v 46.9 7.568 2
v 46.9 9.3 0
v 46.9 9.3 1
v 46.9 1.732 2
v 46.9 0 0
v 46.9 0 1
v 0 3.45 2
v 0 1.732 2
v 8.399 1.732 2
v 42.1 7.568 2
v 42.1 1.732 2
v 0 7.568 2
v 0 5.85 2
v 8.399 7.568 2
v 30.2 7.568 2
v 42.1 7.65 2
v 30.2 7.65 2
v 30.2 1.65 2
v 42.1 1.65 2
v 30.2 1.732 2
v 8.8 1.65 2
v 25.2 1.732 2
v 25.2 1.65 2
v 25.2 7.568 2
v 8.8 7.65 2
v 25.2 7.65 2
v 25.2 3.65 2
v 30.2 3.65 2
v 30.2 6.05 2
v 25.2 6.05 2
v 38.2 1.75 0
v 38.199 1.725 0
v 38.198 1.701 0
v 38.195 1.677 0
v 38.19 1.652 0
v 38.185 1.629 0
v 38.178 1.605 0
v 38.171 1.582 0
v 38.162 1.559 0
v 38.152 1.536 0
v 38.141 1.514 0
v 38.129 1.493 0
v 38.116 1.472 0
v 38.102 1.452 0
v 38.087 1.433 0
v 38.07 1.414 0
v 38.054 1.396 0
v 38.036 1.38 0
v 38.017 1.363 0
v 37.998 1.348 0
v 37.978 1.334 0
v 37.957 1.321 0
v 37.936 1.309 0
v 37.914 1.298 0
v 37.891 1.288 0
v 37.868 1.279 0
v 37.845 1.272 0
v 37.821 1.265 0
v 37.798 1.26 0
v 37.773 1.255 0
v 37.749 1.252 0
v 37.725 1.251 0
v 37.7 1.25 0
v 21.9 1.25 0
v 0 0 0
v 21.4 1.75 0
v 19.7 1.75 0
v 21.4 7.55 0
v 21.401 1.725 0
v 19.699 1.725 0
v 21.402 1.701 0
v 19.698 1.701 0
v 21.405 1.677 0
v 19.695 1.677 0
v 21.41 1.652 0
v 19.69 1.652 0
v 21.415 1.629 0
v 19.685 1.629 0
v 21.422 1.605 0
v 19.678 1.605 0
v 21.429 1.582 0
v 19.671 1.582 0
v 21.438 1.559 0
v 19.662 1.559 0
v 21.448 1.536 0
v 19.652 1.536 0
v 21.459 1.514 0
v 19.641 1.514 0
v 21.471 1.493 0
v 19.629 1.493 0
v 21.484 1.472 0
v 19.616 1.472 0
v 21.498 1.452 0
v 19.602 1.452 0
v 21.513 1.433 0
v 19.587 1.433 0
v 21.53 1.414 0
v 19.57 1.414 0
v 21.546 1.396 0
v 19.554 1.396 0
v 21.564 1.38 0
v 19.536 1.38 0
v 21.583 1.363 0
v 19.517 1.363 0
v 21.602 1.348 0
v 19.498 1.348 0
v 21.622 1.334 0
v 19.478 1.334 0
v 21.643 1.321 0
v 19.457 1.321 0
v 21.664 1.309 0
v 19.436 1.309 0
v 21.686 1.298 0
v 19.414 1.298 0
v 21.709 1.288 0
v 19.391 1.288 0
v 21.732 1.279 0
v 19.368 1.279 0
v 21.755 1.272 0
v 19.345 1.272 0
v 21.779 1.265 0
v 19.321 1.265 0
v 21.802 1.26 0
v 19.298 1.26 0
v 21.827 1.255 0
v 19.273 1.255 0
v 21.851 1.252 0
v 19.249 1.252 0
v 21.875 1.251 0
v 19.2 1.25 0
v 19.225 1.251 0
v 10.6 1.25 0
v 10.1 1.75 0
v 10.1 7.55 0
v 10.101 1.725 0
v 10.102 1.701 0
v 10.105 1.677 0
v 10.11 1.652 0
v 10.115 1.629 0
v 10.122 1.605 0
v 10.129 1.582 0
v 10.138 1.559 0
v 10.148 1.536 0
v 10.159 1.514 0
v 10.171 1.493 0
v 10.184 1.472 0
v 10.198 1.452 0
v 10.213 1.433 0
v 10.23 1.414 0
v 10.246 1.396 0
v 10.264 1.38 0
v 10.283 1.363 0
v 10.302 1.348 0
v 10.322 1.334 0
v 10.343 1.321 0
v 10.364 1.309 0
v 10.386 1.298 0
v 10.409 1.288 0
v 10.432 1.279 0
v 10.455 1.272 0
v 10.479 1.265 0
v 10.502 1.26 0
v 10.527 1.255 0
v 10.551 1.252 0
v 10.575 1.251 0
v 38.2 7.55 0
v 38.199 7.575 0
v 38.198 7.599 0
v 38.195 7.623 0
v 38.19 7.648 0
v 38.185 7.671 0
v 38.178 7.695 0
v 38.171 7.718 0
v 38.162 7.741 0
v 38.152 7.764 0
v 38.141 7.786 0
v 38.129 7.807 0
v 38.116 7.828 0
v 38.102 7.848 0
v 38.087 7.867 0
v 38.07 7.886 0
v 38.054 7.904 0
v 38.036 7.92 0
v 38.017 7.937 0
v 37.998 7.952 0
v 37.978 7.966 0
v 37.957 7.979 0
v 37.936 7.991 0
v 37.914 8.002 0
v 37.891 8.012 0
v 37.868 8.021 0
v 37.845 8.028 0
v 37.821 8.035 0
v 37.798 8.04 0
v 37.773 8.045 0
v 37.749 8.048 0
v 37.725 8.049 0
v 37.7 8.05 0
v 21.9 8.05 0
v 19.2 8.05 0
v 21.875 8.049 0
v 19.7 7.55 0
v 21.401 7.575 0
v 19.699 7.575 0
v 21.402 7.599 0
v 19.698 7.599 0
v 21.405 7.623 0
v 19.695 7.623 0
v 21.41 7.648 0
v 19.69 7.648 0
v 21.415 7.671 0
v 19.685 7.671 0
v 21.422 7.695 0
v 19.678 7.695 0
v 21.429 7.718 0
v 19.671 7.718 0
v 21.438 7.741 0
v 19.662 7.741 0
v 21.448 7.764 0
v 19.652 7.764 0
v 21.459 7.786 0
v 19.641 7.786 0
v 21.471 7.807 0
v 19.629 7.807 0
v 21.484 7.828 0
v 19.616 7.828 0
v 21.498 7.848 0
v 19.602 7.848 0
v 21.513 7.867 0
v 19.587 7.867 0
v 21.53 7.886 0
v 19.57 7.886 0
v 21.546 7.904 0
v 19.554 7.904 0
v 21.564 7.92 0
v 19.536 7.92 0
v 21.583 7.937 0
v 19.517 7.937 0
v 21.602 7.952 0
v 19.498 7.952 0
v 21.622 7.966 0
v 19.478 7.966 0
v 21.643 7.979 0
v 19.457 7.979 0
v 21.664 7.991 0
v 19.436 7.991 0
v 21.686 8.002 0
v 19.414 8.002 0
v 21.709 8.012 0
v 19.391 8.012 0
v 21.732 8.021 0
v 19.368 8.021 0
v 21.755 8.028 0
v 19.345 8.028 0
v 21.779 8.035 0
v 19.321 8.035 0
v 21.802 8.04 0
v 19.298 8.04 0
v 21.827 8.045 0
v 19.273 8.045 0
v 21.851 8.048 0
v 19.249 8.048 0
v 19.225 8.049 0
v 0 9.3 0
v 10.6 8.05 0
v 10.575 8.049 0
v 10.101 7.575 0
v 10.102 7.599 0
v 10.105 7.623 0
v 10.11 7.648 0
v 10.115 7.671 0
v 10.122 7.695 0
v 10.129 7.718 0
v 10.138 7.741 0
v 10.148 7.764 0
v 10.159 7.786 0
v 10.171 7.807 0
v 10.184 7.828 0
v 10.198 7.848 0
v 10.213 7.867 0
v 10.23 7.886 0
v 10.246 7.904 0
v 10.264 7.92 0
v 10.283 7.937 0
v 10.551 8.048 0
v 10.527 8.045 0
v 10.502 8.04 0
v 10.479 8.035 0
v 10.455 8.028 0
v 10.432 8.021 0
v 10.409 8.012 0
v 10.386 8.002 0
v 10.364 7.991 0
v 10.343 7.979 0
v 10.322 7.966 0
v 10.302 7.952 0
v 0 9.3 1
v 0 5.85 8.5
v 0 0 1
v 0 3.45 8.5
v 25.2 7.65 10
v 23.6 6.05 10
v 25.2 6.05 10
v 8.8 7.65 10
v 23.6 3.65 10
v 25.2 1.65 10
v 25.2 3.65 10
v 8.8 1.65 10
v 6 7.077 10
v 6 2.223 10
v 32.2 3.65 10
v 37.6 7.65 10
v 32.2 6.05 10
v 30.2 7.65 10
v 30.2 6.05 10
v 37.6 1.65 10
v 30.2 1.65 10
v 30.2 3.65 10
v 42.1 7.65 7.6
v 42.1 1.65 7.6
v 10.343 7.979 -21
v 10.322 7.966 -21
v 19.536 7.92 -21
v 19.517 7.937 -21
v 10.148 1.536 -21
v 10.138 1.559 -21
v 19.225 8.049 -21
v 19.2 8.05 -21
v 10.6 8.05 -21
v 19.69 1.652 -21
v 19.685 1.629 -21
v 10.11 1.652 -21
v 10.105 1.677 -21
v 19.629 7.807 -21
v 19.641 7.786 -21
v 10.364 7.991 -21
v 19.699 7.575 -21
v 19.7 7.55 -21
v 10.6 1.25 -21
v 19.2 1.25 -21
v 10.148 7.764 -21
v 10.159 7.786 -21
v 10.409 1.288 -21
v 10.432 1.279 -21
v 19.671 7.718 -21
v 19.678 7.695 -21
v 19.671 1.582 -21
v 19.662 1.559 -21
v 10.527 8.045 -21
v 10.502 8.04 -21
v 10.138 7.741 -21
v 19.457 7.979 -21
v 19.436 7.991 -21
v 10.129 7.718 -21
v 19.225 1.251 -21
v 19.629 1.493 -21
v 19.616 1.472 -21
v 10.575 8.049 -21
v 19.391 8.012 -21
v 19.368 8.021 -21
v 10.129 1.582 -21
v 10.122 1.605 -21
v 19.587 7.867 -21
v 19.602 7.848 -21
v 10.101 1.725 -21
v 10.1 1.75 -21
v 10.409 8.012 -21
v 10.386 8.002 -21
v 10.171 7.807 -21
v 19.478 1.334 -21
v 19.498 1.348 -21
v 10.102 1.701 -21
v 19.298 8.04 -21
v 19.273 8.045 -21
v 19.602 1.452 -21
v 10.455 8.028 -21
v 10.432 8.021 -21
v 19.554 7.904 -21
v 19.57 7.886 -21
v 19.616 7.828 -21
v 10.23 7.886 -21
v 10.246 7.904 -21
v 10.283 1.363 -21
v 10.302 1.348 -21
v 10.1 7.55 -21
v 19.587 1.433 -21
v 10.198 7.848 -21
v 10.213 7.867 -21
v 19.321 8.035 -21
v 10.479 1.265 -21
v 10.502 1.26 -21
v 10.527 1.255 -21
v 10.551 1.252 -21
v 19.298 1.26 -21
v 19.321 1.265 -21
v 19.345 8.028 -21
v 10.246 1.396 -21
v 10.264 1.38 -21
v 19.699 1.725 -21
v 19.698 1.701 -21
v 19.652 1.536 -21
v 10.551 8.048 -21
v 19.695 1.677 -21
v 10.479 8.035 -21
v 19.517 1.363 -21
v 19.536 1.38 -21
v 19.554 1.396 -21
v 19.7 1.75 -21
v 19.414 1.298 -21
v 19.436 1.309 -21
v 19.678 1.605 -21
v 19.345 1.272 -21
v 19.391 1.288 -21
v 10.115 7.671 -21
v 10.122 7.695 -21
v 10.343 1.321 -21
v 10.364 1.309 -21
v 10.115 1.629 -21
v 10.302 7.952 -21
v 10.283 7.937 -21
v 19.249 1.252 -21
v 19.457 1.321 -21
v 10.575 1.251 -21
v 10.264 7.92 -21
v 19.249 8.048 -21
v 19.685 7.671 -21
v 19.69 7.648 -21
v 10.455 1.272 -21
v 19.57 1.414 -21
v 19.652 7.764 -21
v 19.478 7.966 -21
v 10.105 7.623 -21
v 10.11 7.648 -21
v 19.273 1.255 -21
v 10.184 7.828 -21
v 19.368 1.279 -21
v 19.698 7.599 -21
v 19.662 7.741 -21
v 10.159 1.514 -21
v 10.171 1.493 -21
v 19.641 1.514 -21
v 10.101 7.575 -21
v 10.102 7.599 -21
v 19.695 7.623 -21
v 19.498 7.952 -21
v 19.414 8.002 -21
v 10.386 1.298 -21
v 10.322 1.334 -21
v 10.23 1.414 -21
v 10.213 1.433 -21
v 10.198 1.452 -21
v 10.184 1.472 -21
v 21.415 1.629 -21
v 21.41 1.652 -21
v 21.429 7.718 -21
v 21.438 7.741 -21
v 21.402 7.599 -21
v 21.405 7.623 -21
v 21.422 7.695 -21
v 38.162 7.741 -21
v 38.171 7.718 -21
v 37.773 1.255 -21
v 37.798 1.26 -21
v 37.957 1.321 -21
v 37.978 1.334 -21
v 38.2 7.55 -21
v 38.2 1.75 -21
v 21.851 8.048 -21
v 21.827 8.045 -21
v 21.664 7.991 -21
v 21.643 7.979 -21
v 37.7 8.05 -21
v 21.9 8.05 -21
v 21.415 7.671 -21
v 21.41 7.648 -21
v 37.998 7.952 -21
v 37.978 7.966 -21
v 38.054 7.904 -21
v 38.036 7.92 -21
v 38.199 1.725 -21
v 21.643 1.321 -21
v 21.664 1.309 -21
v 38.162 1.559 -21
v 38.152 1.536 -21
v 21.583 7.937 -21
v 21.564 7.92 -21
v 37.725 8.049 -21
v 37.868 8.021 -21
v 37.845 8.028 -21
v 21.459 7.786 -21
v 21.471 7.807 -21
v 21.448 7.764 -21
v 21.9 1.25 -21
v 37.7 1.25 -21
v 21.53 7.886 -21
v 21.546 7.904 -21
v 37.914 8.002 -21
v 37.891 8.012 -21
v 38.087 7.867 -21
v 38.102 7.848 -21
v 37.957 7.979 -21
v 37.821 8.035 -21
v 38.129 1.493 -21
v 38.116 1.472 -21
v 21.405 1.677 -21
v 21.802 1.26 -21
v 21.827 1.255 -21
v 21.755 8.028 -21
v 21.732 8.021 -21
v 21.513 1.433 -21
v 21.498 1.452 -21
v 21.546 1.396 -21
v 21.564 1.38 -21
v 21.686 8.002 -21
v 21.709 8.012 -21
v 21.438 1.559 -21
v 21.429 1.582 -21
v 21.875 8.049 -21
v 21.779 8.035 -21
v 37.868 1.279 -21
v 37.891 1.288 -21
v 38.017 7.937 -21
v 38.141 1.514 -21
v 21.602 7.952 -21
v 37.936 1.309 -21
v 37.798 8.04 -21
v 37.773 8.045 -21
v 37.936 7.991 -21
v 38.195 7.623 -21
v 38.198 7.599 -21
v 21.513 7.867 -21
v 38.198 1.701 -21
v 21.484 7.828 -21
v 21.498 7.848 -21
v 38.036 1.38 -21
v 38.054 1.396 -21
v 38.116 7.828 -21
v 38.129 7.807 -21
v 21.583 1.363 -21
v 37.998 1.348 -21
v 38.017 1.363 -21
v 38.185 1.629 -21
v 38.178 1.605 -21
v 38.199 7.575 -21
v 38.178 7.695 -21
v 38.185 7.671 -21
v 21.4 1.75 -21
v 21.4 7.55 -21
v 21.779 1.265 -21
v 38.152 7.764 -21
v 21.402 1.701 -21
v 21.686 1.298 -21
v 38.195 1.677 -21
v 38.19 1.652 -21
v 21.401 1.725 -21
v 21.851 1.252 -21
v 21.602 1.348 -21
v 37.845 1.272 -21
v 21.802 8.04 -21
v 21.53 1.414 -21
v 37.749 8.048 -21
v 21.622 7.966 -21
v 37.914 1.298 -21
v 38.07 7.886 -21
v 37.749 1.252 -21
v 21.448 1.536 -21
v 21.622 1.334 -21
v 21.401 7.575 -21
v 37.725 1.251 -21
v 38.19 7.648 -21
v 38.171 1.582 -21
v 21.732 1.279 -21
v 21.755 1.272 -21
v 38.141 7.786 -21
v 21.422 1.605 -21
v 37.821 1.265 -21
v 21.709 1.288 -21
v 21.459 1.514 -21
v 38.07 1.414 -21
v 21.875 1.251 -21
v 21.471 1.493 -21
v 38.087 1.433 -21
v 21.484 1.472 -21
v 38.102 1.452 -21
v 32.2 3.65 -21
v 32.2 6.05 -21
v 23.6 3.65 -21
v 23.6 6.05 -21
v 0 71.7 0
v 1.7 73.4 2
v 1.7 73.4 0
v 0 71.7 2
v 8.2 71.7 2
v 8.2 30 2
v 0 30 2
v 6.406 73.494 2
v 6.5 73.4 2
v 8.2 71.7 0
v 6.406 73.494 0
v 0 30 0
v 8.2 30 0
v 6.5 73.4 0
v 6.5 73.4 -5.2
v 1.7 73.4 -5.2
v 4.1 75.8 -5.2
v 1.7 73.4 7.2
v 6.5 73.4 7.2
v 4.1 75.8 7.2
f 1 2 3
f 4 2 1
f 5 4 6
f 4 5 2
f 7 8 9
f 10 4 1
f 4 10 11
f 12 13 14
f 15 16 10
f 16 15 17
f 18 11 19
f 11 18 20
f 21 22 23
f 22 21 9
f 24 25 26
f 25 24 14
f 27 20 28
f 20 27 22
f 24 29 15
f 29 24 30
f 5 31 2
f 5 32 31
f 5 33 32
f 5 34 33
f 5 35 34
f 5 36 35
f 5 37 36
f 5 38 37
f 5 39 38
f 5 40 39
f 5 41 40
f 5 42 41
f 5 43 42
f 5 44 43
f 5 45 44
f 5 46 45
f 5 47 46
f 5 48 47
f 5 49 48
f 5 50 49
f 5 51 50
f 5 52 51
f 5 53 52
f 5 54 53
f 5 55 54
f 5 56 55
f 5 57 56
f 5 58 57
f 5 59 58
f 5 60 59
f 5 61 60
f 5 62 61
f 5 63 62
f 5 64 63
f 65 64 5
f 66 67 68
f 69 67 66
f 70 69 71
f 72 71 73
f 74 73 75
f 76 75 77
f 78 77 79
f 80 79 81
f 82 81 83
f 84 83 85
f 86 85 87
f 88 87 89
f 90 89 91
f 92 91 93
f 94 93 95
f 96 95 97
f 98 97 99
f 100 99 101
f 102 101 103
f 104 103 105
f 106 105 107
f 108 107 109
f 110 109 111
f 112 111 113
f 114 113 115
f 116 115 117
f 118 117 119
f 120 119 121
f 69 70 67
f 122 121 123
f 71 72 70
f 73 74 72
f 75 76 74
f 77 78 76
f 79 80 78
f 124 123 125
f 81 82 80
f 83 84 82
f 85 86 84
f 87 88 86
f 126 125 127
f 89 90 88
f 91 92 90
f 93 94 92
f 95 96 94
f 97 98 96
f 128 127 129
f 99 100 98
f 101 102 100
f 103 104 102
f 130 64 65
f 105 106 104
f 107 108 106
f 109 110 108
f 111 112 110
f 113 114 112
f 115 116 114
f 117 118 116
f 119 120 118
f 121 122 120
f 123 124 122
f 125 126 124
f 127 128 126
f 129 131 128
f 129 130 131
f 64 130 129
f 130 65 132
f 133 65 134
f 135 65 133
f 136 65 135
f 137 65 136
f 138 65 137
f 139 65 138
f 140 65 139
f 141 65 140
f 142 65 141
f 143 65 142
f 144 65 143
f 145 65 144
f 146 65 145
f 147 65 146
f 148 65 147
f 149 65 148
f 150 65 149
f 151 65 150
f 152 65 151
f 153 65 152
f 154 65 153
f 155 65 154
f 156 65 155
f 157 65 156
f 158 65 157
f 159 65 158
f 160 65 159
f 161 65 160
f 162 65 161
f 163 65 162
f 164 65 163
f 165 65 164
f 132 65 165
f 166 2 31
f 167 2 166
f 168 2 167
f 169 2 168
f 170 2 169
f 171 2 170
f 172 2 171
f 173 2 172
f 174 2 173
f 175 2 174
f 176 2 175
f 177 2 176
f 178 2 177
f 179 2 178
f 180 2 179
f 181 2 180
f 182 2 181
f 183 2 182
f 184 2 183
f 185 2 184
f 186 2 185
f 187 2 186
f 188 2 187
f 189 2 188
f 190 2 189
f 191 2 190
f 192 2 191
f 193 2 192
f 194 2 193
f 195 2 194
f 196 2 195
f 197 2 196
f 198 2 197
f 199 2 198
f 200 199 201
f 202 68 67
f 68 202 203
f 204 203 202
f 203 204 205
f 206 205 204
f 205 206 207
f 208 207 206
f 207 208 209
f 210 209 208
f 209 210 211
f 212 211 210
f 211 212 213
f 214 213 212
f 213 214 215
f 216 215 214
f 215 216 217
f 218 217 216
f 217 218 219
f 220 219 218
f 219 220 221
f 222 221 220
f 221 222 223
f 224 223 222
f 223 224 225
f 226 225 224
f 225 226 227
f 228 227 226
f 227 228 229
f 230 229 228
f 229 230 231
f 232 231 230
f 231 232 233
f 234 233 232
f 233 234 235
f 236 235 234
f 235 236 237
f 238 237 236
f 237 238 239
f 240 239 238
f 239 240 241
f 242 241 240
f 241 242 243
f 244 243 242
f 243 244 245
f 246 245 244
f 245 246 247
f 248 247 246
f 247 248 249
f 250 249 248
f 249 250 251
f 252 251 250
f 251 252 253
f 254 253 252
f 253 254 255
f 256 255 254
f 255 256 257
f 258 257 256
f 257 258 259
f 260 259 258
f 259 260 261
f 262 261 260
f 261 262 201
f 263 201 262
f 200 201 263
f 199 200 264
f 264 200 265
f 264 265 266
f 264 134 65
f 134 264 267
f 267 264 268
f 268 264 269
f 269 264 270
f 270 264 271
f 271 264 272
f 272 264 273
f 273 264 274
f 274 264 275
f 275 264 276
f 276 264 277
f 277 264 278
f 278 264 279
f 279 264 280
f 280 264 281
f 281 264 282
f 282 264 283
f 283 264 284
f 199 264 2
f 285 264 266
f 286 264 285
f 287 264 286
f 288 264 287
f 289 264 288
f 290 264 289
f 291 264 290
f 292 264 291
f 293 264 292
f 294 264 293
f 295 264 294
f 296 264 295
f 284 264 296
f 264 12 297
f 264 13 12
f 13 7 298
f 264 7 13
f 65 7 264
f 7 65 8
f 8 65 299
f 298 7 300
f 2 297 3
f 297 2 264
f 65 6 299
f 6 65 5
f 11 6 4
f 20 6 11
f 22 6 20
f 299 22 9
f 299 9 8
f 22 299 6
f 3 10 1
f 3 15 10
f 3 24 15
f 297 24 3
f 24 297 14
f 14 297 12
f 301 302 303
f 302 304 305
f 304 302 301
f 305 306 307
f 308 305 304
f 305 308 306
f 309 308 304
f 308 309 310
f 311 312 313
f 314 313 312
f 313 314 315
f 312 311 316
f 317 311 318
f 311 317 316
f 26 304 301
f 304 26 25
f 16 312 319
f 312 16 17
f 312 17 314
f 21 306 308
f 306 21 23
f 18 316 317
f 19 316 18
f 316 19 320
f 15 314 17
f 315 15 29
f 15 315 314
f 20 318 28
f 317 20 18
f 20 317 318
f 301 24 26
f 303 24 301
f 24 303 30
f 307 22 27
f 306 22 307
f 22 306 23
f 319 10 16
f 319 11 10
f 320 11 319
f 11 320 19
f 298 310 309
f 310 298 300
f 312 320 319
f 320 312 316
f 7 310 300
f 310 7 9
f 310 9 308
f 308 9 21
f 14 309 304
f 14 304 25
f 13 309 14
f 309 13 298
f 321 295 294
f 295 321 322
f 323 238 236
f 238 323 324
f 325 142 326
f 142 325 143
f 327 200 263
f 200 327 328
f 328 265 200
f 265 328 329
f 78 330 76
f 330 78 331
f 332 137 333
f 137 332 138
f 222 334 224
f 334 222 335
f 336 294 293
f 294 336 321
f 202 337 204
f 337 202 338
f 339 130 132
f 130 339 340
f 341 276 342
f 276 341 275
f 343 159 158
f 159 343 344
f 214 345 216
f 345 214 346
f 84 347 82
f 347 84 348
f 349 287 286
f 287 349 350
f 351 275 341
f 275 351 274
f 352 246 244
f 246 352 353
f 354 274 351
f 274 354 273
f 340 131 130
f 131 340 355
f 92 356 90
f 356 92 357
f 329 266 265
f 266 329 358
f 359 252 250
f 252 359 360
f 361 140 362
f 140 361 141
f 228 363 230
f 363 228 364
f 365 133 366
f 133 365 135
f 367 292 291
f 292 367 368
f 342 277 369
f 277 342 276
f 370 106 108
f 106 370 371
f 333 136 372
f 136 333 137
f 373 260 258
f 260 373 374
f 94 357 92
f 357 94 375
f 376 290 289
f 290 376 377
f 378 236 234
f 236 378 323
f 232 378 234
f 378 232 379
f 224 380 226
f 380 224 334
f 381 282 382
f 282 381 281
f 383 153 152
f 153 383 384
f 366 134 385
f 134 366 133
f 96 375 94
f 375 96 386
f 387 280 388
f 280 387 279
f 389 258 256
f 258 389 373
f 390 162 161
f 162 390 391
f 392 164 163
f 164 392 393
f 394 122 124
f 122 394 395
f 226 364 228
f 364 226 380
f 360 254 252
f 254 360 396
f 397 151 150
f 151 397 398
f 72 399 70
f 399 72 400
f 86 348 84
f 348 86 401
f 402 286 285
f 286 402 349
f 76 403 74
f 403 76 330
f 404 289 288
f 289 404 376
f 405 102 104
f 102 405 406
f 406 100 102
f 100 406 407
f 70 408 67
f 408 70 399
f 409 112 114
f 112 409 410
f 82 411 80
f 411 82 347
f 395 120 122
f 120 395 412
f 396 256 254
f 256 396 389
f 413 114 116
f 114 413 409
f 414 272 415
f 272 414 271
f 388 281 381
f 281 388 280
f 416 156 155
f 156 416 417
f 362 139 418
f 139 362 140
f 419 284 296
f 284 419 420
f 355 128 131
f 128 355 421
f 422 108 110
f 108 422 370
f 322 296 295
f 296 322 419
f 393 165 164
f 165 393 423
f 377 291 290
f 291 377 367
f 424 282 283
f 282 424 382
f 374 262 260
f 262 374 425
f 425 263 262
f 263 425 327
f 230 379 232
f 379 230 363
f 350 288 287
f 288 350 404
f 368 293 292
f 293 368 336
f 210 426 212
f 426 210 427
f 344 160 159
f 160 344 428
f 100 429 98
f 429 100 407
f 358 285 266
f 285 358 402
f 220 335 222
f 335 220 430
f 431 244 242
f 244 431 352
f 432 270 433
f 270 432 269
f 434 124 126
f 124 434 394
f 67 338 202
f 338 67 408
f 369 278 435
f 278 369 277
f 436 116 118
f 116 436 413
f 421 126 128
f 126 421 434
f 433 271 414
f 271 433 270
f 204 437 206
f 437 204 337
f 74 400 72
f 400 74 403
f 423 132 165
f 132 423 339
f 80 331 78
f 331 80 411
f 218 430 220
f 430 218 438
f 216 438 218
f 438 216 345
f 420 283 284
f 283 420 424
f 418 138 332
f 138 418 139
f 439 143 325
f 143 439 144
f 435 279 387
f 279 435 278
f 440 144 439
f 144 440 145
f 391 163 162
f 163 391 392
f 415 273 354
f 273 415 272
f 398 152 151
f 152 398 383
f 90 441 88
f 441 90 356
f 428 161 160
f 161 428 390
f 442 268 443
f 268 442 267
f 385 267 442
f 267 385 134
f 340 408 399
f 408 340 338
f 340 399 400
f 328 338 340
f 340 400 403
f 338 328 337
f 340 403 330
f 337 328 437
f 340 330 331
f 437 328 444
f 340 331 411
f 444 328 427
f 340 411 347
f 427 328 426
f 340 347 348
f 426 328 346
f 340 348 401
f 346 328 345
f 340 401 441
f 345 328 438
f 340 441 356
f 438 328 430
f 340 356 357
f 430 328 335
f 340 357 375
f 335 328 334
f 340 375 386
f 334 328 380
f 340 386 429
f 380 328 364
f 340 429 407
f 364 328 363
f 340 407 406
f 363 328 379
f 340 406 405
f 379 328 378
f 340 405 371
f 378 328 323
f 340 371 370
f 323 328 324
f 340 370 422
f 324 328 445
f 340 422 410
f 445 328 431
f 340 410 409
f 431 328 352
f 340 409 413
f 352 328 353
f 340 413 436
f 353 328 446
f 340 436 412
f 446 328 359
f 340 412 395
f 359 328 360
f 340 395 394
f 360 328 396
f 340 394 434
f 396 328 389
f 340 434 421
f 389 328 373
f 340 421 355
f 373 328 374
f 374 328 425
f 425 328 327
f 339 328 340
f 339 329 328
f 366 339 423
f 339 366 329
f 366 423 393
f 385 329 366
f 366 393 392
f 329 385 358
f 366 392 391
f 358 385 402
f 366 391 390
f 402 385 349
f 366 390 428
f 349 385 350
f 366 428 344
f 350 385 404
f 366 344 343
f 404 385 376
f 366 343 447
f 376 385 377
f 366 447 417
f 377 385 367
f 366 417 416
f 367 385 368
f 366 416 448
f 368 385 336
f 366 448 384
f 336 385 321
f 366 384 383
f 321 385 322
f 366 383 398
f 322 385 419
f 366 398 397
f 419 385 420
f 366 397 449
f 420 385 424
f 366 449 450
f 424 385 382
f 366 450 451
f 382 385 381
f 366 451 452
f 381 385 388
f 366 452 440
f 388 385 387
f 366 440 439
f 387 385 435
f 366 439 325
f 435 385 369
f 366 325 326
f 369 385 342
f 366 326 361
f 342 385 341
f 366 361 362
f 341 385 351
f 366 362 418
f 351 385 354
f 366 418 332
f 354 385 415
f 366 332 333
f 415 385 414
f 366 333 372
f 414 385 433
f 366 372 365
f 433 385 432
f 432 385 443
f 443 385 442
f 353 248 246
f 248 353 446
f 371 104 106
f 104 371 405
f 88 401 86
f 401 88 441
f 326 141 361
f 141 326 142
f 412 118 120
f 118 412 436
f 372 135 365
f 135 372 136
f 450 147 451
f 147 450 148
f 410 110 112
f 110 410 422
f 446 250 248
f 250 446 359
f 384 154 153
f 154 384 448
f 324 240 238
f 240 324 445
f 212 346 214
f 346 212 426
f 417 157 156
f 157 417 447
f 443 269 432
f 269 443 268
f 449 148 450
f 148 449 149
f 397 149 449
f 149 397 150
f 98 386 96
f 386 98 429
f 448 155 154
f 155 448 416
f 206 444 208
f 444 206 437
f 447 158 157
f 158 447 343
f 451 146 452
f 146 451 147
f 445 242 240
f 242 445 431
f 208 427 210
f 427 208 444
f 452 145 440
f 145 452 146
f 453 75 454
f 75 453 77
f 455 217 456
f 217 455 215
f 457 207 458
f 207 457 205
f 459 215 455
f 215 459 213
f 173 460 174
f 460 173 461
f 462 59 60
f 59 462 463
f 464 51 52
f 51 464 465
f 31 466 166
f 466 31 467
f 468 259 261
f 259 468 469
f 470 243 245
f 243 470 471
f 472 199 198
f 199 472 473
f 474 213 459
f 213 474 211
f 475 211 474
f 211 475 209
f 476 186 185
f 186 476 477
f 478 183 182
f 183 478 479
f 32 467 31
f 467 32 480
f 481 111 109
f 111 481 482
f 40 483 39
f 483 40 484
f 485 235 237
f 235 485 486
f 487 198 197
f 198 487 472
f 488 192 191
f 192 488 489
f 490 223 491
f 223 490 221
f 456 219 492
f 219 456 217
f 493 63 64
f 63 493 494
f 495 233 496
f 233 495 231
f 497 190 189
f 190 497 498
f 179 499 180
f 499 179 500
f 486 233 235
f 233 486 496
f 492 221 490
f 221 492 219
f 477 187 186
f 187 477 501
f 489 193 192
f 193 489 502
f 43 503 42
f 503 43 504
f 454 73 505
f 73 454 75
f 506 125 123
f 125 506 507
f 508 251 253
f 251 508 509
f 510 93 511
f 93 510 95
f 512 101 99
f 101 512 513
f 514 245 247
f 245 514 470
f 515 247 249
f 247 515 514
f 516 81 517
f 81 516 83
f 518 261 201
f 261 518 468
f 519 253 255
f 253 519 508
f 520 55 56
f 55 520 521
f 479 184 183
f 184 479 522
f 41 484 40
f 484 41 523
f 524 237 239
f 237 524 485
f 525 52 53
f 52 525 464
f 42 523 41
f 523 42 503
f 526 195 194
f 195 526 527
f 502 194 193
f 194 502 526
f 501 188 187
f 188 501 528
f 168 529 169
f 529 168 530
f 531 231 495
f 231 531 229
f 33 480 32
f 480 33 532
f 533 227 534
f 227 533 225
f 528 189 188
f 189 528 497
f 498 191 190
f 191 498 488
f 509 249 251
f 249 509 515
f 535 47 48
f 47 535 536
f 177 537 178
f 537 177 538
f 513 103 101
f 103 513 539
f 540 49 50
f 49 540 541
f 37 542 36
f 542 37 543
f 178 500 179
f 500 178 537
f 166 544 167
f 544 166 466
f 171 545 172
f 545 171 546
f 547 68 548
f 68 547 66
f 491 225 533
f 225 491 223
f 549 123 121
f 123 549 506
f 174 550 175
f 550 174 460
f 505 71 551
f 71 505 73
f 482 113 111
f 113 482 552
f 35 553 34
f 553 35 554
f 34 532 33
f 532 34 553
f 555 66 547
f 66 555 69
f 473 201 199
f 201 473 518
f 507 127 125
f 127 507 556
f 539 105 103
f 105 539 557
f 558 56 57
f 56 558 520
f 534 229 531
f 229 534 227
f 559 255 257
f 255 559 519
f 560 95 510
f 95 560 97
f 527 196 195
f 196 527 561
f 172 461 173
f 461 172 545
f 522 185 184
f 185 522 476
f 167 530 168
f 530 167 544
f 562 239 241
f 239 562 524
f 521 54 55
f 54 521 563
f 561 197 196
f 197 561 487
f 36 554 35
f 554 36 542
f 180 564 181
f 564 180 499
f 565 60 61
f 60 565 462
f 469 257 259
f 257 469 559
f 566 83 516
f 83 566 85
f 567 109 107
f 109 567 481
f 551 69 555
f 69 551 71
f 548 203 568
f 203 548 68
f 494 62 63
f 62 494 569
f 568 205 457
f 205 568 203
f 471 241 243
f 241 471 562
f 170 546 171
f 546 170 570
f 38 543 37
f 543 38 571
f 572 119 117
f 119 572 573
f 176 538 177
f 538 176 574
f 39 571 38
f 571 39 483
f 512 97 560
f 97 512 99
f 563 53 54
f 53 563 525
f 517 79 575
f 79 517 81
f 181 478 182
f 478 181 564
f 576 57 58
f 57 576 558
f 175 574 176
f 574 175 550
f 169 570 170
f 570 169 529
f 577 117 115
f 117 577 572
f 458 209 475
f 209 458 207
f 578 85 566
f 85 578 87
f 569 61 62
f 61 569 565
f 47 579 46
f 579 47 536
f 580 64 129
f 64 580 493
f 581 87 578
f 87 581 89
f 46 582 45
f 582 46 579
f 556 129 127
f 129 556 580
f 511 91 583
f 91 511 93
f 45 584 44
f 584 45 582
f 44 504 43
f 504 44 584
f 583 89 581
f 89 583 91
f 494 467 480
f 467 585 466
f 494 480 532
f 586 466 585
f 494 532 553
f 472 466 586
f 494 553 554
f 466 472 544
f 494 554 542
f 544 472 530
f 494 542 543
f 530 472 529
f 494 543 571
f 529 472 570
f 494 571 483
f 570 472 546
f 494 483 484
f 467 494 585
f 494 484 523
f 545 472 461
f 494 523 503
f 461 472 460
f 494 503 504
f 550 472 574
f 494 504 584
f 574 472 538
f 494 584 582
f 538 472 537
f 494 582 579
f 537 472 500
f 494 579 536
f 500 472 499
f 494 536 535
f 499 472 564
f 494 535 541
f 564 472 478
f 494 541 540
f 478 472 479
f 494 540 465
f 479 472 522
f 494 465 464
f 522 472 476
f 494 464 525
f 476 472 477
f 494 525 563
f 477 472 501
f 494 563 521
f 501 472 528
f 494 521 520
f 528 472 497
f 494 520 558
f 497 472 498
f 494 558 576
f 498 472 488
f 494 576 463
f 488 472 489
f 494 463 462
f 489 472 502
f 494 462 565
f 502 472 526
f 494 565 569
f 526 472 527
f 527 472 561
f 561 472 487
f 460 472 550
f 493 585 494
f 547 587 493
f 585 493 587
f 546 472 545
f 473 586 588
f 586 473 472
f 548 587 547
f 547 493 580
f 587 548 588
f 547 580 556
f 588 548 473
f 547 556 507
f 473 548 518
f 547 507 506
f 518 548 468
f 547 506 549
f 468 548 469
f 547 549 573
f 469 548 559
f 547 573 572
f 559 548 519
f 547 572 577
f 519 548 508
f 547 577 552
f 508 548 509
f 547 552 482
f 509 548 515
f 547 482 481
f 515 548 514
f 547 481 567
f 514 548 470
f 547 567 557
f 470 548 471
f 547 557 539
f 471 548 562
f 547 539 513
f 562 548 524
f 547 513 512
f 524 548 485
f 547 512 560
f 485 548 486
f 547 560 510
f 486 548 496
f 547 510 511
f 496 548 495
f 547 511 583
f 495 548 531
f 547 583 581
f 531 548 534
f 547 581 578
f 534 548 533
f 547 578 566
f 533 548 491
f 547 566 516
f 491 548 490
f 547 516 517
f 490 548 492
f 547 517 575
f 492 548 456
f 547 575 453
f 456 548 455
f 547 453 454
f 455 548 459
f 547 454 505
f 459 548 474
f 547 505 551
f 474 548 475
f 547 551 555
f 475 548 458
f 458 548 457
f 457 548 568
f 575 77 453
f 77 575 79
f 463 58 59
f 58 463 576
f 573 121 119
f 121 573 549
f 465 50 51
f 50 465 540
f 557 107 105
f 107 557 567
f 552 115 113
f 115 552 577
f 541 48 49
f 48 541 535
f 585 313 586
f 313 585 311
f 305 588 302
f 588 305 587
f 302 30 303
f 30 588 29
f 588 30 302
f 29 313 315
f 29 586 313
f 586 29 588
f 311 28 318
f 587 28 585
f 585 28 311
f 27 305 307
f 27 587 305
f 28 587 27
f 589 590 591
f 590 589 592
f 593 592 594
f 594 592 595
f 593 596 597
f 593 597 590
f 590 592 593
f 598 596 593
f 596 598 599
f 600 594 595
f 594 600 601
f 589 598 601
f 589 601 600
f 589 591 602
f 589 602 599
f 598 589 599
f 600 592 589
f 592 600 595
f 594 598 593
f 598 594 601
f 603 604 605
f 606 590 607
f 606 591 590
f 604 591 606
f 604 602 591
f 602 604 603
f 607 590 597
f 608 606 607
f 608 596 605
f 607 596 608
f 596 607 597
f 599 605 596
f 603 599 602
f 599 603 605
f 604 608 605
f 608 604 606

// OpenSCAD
// SPDX-License-Identifier: GPL-2.0

generate="both";

base = [46.9, 9.3, 2];
pin_in_h = 21;
pin_in_1 = [9.6, 6.8, pin_in_h];
pin_in_2 = [16.8, 6.8, pin_in_h];
pin_in_dia = 1;
pin_out = [42.1, 6, 8.0];
pin_out_cut = 5;
pin_out_side_poly = [ [0, 0], [0, 6.5],
		      [6, pin_out.z], [37.6, pin_out.z],
		      [pin_out.x, 5.6], [pin_out.x, 0] ];
pin_out_top_poly  = [ [0, 1.8], [8.8, 0],
		      [pin_out.x, 0], [pin_out.x, pin_out.y],
		      [8.8, pin_out.y], [0, 4.2] ];

latch = [8.2, 2, 45.8];
latch_plugin = [latch.x + 0.4, latch.y + 0.4, latch.z];
latch_poly = [ [0, 0], [latch.x, 0],
	        [latch.x, latch.z - latch.x / 2],
		[latch.x / 2, latch.z],
	        [0, latch.z - latch.x / 2],
		[0, latch.z] ];
latch_pin = pin_out_cut - 0.2;
latch_pin_l = latch_pin / 2;
latch_pin_poly = [ [0, 0], [latch_pin, 0], [latch_pin_l, latch_pin_l] ];

module mod_base()
{
	difference() {
		cube(base);
		translate([0, 0, 1])
			rotate([30, 0, 0])
				cube(base);
		translate([0, base.y, 1])
			rotate([-30, 0, 0])
				translate([0, -base.y, 0])
					cube(base);
	}
}

module mod_pin_in_1()
{
	translate([pin_in_dia / 2, pin_in_dia / 2, 0]) hull() {
		cylinder(h = pin_in_1.z, d = pin_in_dia, $fn = 128);
		translate([0, pin_in_1.y - pin_in_dia, 0])
			cylinder(h = pin_in_1.z, d = pin_in_dia, $fn = 128);
		translate([pin_in_1.x - pin_in_dia, 0, 0])
			cylinder(h = pin_in_1.z, d = pin_in_dia, $fn = 128);
		translate([pin_in_1.x - pin_in_dia, pin_in_1.y - pin_in_dia, 0])
			cylinder(h = pin_in_1.z, d = pin_in_dia, $fn = 128);
	}
}

module mod_pin_in_2()
{
	translate([pin_in_dia / 2, pin_in_dia / 2, 0]) hull() {
		cylinder(h = pin_in_2.z, d = pin_in_dia, $fn = 128);
		translate([0, pin_in_2.y - pin_in_dia, 0])
			cylinder(h = pin_in_2.z, d = pin_in_dia, $fn = 128);
		translate([pin_in_2.x - pin_in_dia, 0, 0])
			cylinder(h = pin_in_2.z, d = pin_in_dia, $fn = 128);
		translate([pin_in_2.x - pin_in_dia, pin_in_2.y - pin_in_dia, 0])
			cylinder(h = pin_in_2.z, d = pin_in_dia, $fn = 128);
	}
}

module mod_pin_out()
{
	intersection() {
		difference() {
			cube(pin_out);
			translate([25.2, 0, 0])
				cube([pin_out_cut, pin_out.y, pin_out.z]);
		}
		translate([0, pin_out.y, 0])
			rotate([90, 0, 0])
				linear_extrude(height = pin_out.y, $fn = 128)
					polygon(pin_out_side_poly);
		linear_extrude(height = pin_out.z)
			polygon(pin_out_top_poly);
	}
}

module mod_plugin()
{
	difference() {
		union() {
			mod_base();
			translate([10.1, (base.y - pin_in_1.y) / 2, -pin_in_1.z])
				mod_pin_in_1();
			translate([21.4, (base.y - pin_in_2.y) / 2, -pin_in_2.z])
				mod_pin_in_2();
			translate([0, (base.y - pin_out.y) / 2, base.z])
				mod_pin_out();
		}
		translate([25.2 - (latch.x - pin_out_cut) / 2, (base.y - latch.y) / 2, -pin_in_h])
			cube(latch_plugin);
	}
}

module mod_latch()
{
	linear_extrude(height = latch.y)
		polygon(latch_poly);
	translate([(latch.x - latch_pin) / 2,
		   latch.z - latch_pin_l, -(12.4 - latch.y) / 2])
		linear_extrude(height = 12.4)
			polygon(latch_pin_poly);
}

if (generate == "plugin")
	mod_plugin();

if (generate == "latch")
	mod_latch();

if (generate == "both") {
	mod_plugin();
	translate([0, 30, 0])
		mod_latch();
}
